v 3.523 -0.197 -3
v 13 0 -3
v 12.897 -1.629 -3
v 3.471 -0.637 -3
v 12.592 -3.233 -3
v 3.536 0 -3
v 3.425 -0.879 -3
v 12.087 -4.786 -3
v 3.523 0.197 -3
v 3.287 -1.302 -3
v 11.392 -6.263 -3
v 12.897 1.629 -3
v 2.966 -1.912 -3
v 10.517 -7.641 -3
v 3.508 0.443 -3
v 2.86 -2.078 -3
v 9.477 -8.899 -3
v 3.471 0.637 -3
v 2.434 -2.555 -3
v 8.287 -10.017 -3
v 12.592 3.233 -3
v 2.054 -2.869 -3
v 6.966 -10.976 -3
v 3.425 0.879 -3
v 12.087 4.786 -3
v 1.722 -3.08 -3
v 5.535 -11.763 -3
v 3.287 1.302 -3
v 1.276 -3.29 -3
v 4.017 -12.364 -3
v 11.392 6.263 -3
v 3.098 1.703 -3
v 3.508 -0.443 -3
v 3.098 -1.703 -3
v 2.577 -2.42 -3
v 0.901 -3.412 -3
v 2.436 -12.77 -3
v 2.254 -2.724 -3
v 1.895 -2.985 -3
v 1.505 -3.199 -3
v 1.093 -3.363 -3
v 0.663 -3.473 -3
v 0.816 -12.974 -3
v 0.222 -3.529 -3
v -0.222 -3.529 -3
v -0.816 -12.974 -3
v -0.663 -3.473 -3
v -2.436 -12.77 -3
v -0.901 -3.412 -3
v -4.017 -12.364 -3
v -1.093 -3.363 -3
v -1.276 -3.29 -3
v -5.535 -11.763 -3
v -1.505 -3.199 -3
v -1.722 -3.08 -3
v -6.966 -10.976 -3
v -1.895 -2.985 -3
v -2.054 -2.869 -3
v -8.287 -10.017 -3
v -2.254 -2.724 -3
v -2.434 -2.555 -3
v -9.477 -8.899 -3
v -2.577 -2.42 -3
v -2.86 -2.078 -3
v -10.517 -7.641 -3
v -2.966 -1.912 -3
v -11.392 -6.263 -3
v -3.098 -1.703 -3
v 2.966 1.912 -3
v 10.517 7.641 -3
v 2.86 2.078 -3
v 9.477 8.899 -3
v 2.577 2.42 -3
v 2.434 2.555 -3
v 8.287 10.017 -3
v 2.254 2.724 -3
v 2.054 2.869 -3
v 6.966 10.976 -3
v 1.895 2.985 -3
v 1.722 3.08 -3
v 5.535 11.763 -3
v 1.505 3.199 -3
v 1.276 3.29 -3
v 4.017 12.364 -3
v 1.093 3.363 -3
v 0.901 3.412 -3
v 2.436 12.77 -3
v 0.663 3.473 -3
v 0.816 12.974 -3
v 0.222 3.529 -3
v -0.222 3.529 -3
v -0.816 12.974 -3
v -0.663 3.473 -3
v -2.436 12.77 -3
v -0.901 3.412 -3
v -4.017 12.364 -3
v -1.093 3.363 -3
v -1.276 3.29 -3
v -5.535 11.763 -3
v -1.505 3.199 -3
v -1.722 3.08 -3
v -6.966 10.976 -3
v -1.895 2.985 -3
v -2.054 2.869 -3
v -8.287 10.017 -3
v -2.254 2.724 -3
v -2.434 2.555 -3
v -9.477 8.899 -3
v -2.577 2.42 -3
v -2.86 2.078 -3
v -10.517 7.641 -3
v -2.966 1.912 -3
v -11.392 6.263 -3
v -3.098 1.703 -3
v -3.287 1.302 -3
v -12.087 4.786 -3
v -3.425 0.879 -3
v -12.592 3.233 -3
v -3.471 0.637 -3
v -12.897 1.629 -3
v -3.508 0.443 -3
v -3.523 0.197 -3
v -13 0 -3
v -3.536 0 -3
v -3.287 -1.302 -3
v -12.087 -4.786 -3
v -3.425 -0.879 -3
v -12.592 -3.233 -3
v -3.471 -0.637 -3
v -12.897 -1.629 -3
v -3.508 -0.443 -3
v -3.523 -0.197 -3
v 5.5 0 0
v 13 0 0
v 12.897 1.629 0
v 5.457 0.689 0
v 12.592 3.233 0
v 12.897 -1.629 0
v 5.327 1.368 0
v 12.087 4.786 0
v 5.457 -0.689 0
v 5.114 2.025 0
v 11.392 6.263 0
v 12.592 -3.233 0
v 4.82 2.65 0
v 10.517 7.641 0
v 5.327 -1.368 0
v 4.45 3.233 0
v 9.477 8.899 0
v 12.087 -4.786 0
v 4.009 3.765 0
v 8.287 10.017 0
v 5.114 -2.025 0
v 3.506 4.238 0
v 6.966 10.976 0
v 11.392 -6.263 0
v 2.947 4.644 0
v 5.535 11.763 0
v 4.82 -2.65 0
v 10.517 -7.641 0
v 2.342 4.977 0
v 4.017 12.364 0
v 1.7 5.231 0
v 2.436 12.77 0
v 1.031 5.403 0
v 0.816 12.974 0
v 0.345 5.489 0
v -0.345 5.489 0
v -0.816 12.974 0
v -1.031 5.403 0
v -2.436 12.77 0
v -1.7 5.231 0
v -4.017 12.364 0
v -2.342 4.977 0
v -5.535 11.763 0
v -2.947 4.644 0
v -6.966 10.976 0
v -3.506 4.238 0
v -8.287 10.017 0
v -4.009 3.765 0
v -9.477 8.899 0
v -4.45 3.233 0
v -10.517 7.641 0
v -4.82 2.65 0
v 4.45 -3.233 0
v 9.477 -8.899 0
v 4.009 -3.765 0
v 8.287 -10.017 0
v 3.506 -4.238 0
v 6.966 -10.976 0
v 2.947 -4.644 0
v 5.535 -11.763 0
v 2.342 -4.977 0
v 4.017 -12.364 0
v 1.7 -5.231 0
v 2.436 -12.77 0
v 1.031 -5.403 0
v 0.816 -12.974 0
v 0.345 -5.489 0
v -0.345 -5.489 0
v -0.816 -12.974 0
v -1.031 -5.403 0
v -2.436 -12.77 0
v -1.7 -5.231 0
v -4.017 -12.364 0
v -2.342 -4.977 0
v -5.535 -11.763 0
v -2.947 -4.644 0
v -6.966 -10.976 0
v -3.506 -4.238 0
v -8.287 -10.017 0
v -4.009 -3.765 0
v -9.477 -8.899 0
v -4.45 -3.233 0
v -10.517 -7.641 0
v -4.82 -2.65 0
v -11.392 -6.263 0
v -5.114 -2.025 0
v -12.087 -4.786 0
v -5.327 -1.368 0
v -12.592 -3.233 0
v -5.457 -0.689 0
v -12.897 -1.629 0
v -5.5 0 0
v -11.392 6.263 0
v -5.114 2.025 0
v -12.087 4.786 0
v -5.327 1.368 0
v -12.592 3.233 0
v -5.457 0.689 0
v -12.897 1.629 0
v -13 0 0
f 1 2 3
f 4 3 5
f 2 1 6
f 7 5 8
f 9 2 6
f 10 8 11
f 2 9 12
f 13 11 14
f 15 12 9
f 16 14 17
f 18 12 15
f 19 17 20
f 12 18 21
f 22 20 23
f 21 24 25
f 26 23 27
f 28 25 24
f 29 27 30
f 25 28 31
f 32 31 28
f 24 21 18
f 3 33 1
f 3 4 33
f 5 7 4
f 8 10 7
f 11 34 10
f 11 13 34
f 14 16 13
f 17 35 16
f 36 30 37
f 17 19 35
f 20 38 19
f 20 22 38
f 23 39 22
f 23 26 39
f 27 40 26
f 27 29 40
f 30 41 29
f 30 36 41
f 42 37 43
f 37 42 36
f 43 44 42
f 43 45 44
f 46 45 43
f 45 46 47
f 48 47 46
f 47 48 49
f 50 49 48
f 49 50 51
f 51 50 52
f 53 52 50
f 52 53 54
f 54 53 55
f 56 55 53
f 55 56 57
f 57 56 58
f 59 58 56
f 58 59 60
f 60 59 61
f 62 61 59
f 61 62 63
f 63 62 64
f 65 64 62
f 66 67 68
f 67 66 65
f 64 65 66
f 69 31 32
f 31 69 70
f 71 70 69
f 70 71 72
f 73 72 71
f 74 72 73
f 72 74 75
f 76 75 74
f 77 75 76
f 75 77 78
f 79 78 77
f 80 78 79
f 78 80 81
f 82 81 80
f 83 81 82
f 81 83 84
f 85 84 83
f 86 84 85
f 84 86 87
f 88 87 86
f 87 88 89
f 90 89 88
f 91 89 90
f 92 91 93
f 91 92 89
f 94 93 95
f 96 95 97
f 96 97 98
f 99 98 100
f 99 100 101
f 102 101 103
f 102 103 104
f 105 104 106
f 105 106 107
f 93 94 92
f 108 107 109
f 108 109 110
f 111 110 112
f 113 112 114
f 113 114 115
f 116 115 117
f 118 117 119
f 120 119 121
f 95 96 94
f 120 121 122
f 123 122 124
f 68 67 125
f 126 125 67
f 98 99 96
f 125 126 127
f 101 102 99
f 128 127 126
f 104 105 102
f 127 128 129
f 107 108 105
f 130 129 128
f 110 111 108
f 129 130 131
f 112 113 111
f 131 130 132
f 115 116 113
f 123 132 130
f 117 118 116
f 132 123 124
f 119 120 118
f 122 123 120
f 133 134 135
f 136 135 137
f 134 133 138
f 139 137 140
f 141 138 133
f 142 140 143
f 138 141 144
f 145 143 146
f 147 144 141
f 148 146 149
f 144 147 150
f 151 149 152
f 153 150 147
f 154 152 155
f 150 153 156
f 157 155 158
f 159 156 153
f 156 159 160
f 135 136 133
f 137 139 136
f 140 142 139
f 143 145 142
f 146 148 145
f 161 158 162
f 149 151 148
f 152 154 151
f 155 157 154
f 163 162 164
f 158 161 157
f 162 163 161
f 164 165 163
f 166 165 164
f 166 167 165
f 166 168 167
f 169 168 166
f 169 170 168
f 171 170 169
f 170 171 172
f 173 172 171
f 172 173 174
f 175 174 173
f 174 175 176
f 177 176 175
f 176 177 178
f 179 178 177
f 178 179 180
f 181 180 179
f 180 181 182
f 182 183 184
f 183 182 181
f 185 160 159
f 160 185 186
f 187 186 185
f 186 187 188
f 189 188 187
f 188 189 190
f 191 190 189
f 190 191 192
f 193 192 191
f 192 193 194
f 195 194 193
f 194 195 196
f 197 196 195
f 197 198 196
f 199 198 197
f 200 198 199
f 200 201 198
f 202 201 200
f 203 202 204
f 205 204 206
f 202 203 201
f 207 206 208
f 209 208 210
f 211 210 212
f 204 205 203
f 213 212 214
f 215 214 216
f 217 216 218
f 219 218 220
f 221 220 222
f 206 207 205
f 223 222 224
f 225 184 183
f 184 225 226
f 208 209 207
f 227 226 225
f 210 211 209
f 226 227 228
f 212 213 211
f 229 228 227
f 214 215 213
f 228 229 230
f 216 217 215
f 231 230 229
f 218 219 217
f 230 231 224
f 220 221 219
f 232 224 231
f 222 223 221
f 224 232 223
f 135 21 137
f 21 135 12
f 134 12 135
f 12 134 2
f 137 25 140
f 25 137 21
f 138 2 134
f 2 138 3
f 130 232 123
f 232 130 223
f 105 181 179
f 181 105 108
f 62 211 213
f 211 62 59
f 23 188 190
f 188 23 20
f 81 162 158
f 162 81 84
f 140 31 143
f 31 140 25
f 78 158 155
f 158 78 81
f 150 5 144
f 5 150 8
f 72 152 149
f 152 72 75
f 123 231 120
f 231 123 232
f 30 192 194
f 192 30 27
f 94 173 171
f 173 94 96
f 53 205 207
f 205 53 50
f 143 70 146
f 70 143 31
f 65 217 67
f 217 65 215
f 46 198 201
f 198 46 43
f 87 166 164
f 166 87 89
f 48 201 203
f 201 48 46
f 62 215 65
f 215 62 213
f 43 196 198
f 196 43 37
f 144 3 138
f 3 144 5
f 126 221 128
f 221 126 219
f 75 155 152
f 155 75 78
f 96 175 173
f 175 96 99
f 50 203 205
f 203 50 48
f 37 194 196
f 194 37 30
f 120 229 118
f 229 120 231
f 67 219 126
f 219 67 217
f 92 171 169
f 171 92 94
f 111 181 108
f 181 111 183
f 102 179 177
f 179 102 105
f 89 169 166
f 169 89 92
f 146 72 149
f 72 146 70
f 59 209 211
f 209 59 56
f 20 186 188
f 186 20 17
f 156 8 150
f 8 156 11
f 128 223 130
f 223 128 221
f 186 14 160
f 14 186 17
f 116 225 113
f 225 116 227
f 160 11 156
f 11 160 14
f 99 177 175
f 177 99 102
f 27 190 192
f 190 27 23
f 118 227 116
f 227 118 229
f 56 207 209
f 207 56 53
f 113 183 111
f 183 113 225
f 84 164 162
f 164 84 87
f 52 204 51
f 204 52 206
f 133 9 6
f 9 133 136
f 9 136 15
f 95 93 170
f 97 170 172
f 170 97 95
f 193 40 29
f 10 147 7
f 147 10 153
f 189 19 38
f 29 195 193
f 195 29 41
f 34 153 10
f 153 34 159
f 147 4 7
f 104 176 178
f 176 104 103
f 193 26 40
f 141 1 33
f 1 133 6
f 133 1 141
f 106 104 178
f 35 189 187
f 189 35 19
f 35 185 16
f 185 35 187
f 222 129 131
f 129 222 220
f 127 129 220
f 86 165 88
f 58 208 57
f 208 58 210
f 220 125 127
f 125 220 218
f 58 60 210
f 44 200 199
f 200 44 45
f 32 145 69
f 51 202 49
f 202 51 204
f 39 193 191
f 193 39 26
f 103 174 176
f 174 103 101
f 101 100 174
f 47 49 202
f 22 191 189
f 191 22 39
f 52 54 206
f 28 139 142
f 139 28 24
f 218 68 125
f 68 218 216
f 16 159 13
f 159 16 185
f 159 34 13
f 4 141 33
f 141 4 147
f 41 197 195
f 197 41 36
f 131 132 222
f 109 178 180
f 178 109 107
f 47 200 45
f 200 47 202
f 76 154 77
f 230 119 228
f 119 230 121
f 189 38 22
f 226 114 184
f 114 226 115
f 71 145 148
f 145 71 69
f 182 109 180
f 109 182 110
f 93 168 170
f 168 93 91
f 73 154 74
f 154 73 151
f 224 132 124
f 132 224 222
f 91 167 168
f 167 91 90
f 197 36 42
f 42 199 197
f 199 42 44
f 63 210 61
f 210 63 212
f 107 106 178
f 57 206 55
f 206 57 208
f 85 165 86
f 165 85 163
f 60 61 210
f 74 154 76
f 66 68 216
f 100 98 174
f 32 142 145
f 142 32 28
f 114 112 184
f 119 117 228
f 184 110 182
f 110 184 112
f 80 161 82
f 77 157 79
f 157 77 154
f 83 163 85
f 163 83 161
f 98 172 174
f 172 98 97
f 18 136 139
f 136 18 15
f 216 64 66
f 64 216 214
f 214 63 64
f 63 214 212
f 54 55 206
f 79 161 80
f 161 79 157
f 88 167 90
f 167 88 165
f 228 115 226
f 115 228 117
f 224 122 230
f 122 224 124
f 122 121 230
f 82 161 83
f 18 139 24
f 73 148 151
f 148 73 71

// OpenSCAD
$fn = 50;


difference() {
	union() {
		translate(v = [0, 0, -3.0000000000]) {
			cylinder(h = 3, r = 7.0000000000);
		}
		translate(v = [0, 0, -3.0000000000]) {
			cylinder(h = 3, r = 13.0000000000);
		}
	}
	union() {
		translate(v = [0, 0, 0]) {
			rotate(a = [0, 0, 0]) {
				difference() {
					union() {
						#translate(v = [0, 0, -3.0000000000]) {
							cylinder(h = 3, r = 2.2500000000);
						}
						#translate(v = [0, 0, -4.2000000000]) {
							cylinder(h = 4.2000000000, r1 = 2.7500000000, r2 = 5.5000000000);
						}
						#translate(v = [0, 0, -3.0000000000]) {
							cylinder(h = 3, r = 2.7500000000);
						}
						#translate(v = [0, 0, -3.0000000000]) {
							cylinder(h = 3, r = 2.2500000000);
						}
					}
					union();
				}
			}
		}
	}
}
